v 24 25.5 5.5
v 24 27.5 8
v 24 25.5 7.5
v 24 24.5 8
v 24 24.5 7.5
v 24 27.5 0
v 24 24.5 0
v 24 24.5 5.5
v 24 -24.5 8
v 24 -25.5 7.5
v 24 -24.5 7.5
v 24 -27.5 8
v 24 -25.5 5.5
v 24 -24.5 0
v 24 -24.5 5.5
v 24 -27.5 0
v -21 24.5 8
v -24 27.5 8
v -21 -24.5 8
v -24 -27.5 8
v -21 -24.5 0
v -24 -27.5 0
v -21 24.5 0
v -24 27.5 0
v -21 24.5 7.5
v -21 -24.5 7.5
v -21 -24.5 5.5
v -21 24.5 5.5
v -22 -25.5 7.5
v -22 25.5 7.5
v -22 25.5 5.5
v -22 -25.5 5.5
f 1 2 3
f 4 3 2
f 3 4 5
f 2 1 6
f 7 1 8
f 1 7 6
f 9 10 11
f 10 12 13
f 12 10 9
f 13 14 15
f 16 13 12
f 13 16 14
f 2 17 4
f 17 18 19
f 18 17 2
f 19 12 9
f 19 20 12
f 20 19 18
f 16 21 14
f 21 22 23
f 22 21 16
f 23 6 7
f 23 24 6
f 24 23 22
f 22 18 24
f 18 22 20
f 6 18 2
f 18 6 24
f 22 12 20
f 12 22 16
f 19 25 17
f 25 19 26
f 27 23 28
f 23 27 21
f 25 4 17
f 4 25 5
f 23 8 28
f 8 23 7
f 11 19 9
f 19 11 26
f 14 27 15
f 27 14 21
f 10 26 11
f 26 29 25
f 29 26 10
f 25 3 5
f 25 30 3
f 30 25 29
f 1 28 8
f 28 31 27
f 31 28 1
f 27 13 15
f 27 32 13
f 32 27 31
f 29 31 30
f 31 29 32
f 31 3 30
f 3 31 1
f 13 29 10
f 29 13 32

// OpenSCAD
ProtoBoardSupport();

module ProtoBoardSupport(
	boardSizeX		= 44,		// 50.82 actual
	boardSizeY		= 51,		// 43.18 actual
	boardThickness	= 2,			// 1.59 actual
	railDepth		= 2,
	railHeightOffset	= 5
)
{
	nozzleDiameter		= 0.4;
	targetWallThickness	= 2;
	headroom				= 1;

	// correct the wall thickness to make it a multiple of the nozzle diameter
	wallThickness = floor(targetWallThickness / nozzleDiameter) * nozzleDiameter;
	if( targetWallThickness != wallThickness ){
		echo(str("Wall thickness corrected to multiple of nozzle diameter: ", wallThickness));
	}

	boxSize	= [	boardSizeX + wallThickness * 2,
				boardSizeY + wallThickness * 2,
				railHeightOffset + boardThickness + headroom];

	translate([0, 0, boxSize[2]/2])
		difference(){
			// Create the shell of the board support box
			cube(boxSize, center=true);
			// hollow out the box
			translate([wallThickness, 0, 0])
				cube([	boardSizeX - railDepth + wallThickness * 2, 
						boardSizeY - railDepth, 
						(railHeightOffset + boardThickness + headroom) * 2], center=true);
			// make the rails
			translate([wallThickness, 0, railHeightOffset/2])
				cube([boardSizeX + wallThickness * 2, boardSizeY, boardThickness], center=true);
		} // difference

} // ProtoBoardSupport module
